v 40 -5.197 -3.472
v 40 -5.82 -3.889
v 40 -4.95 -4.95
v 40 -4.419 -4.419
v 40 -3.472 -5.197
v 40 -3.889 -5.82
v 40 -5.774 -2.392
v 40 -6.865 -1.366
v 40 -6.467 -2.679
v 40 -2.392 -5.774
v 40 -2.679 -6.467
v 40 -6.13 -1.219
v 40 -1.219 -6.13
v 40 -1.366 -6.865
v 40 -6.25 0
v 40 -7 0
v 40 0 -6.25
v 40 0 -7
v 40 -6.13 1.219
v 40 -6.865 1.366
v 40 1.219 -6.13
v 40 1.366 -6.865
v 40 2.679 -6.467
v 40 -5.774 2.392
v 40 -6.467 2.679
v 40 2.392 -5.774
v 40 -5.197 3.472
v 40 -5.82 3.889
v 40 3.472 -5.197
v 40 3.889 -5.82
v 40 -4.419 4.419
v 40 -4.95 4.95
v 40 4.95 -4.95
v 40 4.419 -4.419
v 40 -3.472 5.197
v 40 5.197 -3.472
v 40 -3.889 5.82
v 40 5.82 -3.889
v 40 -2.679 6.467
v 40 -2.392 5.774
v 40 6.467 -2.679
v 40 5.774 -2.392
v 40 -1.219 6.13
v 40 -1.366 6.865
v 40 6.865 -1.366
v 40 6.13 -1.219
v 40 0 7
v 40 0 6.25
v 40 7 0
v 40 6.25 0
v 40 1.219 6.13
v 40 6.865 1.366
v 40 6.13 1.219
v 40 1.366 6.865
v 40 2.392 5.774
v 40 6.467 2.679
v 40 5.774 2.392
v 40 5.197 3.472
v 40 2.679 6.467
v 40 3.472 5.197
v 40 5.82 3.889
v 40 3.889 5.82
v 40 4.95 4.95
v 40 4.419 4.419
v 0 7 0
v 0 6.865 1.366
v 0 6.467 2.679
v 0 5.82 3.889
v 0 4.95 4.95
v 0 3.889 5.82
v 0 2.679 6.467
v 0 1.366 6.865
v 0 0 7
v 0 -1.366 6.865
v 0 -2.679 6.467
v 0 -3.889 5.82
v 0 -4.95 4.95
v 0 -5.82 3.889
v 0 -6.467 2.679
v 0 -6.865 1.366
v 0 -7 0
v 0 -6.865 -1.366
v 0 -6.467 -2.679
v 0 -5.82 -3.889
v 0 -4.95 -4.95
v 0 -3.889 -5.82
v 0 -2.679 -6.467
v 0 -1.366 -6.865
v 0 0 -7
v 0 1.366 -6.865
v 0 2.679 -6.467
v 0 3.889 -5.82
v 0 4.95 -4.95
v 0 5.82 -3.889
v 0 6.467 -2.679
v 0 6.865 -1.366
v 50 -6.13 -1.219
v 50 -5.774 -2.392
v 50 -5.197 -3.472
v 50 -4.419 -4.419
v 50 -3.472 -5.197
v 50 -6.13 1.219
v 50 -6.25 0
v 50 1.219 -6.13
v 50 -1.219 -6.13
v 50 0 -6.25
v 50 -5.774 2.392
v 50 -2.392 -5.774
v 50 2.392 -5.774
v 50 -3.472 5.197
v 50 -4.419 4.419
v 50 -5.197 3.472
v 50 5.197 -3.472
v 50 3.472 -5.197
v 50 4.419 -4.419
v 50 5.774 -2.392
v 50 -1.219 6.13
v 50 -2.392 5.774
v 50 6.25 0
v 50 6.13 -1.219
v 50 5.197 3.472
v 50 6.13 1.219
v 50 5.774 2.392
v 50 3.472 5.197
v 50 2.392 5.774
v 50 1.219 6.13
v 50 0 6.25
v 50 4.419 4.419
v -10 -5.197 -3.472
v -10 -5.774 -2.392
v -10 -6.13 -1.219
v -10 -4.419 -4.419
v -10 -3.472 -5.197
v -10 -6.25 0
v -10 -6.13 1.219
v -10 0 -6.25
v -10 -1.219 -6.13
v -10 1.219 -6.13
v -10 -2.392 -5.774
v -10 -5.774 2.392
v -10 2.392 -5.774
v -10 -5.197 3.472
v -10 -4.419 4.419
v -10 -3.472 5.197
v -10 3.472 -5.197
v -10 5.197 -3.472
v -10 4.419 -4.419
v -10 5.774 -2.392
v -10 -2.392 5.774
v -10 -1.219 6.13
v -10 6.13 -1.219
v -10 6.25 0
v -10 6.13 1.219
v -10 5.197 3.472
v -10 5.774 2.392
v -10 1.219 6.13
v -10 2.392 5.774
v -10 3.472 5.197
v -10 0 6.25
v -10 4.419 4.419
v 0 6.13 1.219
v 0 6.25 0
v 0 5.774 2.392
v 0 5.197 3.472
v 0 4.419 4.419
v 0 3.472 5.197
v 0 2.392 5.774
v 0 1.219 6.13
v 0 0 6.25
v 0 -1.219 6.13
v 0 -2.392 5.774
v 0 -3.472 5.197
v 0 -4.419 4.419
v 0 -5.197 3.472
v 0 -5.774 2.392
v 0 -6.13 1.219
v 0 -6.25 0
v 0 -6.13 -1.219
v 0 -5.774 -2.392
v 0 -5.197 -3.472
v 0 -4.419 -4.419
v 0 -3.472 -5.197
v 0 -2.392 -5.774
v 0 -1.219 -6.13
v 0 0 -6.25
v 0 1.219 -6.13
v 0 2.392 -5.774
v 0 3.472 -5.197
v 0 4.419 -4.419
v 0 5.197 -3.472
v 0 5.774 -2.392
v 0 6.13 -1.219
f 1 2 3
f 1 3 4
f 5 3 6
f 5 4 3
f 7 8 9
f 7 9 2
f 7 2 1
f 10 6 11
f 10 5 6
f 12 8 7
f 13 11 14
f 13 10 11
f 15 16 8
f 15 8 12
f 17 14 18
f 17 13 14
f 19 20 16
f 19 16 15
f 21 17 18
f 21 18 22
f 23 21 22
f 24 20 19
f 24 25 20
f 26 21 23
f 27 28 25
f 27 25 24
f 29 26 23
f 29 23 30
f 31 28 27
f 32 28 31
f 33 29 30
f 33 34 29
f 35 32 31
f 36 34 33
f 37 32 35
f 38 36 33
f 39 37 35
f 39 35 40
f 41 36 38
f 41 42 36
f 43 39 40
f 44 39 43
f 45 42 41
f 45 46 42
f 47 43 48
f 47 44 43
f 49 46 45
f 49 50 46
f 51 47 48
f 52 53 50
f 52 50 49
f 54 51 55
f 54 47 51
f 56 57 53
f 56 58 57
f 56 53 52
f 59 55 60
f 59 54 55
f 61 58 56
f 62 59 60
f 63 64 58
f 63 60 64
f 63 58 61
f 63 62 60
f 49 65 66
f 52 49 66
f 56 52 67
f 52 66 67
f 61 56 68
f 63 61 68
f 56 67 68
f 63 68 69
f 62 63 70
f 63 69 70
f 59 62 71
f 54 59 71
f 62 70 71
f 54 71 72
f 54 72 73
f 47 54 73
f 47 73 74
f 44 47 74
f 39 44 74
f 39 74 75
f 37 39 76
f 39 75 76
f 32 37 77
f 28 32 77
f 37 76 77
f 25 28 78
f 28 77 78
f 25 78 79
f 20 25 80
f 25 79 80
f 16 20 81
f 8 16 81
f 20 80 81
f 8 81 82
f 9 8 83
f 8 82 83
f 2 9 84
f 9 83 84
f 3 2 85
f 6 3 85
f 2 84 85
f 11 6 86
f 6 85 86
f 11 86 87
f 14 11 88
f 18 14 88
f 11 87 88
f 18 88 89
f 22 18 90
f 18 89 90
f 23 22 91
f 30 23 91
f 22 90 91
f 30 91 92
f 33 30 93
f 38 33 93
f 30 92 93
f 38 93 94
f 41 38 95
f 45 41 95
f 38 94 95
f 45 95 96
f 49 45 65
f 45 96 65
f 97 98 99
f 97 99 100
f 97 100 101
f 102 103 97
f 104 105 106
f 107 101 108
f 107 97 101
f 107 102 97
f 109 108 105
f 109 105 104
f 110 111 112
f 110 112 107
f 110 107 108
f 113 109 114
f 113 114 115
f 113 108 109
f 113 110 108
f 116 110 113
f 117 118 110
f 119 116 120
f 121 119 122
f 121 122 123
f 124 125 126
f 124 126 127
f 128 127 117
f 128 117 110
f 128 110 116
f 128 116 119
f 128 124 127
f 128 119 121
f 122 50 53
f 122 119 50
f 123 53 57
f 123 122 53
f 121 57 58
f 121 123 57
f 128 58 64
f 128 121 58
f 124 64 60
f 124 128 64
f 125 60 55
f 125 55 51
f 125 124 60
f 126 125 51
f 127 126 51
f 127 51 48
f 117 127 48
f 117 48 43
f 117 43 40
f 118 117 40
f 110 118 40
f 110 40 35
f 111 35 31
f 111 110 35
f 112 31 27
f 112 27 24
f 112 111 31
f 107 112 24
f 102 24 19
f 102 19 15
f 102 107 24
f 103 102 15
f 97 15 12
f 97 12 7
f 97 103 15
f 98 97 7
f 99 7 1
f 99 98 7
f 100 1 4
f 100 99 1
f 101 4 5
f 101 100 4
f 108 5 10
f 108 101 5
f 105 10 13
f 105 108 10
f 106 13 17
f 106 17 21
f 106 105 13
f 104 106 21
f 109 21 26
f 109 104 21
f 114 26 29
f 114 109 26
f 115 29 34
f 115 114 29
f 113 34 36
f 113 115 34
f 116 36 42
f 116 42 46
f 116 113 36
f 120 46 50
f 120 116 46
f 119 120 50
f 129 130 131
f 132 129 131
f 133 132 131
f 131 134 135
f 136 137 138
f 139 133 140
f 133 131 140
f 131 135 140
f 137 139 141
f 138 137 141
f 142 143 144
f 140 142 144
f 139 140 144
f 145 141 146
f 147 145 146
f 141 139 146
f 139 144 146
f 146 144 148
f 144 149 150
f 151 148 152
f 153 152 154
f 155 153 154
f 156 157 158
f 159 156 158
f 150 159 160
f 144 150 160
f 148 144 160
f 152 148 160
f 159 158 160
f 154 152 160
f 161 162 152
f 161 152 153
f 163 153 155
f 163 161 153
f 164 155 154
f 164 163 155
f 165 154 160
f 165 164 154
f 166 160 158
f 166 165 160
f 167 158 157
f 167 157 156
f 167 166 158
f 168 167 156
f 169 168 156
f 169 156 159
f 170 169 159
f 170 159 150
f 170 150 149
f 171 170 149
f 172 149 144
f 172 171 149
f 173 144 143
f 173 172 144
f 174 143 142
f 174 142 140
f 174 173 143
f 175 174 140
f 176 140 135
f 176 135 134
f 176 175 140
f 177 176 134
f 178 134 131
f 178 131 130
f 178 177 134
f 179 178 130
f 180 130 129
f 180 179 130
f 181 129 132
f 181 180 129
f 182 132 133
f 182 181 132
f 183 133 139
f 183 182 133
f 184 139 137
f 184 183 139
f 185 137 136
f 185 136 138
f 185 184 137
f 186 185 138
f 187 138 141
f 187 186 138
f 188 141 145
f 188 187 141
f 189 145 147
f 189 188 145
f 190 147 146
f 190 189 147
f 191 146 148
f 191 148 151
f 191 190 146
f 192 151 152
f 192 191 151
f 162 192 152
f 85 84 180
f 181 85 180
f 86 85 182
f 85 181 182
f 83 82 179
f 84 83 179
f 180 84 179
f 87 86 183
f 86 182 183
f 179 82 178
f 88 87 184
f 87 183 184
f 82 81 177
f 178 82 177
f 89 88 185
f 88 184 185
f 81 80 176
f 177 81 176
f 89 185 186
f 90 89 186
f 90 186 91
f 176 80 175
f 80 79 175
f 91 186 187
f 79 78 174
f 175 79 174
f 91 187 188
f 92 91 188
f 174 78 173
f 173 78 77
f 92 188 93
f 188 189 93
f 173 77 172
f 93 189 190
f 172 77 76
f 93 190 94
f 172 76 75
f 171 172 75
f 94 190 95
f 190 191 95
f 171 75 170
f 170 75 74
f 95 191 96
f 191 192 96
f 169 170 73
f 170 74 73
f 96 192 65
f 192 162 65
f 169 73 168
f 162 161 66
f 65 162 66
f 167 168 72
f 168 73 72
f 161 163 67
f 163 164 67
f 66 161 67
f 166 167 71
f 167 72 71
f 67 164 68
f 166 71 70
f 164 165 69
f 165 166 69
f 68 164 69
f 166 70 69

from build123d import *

# Parameters (mm, degrees)
F0_R          = 6.25
F1_DEPTH      = 50
F1_DEPTH_BACK = 10
F0_R_2        = 7
F2_DEPTH      = 40


with BuildPart() as f1:
    # F0 (on Right) → F1 (new body, two sides)
    with BuildSketch(Plane.YZ) as f1_sk:
        Circle(F0_R)
    extrude(amount=F1_DEPTH)
    extrude(f1_sk.sketch, amount=-F1_DEPTH_BACK)

    # F0 (on Right) → F2 (join)
    with BuildSketch(Plane.YZ):
        Circle(F0_R_2)
        Circle(F0_R, mode=Mode.SUBTRACT)
    extrude(amount=F2_DEPTH)


solid = f1.part
